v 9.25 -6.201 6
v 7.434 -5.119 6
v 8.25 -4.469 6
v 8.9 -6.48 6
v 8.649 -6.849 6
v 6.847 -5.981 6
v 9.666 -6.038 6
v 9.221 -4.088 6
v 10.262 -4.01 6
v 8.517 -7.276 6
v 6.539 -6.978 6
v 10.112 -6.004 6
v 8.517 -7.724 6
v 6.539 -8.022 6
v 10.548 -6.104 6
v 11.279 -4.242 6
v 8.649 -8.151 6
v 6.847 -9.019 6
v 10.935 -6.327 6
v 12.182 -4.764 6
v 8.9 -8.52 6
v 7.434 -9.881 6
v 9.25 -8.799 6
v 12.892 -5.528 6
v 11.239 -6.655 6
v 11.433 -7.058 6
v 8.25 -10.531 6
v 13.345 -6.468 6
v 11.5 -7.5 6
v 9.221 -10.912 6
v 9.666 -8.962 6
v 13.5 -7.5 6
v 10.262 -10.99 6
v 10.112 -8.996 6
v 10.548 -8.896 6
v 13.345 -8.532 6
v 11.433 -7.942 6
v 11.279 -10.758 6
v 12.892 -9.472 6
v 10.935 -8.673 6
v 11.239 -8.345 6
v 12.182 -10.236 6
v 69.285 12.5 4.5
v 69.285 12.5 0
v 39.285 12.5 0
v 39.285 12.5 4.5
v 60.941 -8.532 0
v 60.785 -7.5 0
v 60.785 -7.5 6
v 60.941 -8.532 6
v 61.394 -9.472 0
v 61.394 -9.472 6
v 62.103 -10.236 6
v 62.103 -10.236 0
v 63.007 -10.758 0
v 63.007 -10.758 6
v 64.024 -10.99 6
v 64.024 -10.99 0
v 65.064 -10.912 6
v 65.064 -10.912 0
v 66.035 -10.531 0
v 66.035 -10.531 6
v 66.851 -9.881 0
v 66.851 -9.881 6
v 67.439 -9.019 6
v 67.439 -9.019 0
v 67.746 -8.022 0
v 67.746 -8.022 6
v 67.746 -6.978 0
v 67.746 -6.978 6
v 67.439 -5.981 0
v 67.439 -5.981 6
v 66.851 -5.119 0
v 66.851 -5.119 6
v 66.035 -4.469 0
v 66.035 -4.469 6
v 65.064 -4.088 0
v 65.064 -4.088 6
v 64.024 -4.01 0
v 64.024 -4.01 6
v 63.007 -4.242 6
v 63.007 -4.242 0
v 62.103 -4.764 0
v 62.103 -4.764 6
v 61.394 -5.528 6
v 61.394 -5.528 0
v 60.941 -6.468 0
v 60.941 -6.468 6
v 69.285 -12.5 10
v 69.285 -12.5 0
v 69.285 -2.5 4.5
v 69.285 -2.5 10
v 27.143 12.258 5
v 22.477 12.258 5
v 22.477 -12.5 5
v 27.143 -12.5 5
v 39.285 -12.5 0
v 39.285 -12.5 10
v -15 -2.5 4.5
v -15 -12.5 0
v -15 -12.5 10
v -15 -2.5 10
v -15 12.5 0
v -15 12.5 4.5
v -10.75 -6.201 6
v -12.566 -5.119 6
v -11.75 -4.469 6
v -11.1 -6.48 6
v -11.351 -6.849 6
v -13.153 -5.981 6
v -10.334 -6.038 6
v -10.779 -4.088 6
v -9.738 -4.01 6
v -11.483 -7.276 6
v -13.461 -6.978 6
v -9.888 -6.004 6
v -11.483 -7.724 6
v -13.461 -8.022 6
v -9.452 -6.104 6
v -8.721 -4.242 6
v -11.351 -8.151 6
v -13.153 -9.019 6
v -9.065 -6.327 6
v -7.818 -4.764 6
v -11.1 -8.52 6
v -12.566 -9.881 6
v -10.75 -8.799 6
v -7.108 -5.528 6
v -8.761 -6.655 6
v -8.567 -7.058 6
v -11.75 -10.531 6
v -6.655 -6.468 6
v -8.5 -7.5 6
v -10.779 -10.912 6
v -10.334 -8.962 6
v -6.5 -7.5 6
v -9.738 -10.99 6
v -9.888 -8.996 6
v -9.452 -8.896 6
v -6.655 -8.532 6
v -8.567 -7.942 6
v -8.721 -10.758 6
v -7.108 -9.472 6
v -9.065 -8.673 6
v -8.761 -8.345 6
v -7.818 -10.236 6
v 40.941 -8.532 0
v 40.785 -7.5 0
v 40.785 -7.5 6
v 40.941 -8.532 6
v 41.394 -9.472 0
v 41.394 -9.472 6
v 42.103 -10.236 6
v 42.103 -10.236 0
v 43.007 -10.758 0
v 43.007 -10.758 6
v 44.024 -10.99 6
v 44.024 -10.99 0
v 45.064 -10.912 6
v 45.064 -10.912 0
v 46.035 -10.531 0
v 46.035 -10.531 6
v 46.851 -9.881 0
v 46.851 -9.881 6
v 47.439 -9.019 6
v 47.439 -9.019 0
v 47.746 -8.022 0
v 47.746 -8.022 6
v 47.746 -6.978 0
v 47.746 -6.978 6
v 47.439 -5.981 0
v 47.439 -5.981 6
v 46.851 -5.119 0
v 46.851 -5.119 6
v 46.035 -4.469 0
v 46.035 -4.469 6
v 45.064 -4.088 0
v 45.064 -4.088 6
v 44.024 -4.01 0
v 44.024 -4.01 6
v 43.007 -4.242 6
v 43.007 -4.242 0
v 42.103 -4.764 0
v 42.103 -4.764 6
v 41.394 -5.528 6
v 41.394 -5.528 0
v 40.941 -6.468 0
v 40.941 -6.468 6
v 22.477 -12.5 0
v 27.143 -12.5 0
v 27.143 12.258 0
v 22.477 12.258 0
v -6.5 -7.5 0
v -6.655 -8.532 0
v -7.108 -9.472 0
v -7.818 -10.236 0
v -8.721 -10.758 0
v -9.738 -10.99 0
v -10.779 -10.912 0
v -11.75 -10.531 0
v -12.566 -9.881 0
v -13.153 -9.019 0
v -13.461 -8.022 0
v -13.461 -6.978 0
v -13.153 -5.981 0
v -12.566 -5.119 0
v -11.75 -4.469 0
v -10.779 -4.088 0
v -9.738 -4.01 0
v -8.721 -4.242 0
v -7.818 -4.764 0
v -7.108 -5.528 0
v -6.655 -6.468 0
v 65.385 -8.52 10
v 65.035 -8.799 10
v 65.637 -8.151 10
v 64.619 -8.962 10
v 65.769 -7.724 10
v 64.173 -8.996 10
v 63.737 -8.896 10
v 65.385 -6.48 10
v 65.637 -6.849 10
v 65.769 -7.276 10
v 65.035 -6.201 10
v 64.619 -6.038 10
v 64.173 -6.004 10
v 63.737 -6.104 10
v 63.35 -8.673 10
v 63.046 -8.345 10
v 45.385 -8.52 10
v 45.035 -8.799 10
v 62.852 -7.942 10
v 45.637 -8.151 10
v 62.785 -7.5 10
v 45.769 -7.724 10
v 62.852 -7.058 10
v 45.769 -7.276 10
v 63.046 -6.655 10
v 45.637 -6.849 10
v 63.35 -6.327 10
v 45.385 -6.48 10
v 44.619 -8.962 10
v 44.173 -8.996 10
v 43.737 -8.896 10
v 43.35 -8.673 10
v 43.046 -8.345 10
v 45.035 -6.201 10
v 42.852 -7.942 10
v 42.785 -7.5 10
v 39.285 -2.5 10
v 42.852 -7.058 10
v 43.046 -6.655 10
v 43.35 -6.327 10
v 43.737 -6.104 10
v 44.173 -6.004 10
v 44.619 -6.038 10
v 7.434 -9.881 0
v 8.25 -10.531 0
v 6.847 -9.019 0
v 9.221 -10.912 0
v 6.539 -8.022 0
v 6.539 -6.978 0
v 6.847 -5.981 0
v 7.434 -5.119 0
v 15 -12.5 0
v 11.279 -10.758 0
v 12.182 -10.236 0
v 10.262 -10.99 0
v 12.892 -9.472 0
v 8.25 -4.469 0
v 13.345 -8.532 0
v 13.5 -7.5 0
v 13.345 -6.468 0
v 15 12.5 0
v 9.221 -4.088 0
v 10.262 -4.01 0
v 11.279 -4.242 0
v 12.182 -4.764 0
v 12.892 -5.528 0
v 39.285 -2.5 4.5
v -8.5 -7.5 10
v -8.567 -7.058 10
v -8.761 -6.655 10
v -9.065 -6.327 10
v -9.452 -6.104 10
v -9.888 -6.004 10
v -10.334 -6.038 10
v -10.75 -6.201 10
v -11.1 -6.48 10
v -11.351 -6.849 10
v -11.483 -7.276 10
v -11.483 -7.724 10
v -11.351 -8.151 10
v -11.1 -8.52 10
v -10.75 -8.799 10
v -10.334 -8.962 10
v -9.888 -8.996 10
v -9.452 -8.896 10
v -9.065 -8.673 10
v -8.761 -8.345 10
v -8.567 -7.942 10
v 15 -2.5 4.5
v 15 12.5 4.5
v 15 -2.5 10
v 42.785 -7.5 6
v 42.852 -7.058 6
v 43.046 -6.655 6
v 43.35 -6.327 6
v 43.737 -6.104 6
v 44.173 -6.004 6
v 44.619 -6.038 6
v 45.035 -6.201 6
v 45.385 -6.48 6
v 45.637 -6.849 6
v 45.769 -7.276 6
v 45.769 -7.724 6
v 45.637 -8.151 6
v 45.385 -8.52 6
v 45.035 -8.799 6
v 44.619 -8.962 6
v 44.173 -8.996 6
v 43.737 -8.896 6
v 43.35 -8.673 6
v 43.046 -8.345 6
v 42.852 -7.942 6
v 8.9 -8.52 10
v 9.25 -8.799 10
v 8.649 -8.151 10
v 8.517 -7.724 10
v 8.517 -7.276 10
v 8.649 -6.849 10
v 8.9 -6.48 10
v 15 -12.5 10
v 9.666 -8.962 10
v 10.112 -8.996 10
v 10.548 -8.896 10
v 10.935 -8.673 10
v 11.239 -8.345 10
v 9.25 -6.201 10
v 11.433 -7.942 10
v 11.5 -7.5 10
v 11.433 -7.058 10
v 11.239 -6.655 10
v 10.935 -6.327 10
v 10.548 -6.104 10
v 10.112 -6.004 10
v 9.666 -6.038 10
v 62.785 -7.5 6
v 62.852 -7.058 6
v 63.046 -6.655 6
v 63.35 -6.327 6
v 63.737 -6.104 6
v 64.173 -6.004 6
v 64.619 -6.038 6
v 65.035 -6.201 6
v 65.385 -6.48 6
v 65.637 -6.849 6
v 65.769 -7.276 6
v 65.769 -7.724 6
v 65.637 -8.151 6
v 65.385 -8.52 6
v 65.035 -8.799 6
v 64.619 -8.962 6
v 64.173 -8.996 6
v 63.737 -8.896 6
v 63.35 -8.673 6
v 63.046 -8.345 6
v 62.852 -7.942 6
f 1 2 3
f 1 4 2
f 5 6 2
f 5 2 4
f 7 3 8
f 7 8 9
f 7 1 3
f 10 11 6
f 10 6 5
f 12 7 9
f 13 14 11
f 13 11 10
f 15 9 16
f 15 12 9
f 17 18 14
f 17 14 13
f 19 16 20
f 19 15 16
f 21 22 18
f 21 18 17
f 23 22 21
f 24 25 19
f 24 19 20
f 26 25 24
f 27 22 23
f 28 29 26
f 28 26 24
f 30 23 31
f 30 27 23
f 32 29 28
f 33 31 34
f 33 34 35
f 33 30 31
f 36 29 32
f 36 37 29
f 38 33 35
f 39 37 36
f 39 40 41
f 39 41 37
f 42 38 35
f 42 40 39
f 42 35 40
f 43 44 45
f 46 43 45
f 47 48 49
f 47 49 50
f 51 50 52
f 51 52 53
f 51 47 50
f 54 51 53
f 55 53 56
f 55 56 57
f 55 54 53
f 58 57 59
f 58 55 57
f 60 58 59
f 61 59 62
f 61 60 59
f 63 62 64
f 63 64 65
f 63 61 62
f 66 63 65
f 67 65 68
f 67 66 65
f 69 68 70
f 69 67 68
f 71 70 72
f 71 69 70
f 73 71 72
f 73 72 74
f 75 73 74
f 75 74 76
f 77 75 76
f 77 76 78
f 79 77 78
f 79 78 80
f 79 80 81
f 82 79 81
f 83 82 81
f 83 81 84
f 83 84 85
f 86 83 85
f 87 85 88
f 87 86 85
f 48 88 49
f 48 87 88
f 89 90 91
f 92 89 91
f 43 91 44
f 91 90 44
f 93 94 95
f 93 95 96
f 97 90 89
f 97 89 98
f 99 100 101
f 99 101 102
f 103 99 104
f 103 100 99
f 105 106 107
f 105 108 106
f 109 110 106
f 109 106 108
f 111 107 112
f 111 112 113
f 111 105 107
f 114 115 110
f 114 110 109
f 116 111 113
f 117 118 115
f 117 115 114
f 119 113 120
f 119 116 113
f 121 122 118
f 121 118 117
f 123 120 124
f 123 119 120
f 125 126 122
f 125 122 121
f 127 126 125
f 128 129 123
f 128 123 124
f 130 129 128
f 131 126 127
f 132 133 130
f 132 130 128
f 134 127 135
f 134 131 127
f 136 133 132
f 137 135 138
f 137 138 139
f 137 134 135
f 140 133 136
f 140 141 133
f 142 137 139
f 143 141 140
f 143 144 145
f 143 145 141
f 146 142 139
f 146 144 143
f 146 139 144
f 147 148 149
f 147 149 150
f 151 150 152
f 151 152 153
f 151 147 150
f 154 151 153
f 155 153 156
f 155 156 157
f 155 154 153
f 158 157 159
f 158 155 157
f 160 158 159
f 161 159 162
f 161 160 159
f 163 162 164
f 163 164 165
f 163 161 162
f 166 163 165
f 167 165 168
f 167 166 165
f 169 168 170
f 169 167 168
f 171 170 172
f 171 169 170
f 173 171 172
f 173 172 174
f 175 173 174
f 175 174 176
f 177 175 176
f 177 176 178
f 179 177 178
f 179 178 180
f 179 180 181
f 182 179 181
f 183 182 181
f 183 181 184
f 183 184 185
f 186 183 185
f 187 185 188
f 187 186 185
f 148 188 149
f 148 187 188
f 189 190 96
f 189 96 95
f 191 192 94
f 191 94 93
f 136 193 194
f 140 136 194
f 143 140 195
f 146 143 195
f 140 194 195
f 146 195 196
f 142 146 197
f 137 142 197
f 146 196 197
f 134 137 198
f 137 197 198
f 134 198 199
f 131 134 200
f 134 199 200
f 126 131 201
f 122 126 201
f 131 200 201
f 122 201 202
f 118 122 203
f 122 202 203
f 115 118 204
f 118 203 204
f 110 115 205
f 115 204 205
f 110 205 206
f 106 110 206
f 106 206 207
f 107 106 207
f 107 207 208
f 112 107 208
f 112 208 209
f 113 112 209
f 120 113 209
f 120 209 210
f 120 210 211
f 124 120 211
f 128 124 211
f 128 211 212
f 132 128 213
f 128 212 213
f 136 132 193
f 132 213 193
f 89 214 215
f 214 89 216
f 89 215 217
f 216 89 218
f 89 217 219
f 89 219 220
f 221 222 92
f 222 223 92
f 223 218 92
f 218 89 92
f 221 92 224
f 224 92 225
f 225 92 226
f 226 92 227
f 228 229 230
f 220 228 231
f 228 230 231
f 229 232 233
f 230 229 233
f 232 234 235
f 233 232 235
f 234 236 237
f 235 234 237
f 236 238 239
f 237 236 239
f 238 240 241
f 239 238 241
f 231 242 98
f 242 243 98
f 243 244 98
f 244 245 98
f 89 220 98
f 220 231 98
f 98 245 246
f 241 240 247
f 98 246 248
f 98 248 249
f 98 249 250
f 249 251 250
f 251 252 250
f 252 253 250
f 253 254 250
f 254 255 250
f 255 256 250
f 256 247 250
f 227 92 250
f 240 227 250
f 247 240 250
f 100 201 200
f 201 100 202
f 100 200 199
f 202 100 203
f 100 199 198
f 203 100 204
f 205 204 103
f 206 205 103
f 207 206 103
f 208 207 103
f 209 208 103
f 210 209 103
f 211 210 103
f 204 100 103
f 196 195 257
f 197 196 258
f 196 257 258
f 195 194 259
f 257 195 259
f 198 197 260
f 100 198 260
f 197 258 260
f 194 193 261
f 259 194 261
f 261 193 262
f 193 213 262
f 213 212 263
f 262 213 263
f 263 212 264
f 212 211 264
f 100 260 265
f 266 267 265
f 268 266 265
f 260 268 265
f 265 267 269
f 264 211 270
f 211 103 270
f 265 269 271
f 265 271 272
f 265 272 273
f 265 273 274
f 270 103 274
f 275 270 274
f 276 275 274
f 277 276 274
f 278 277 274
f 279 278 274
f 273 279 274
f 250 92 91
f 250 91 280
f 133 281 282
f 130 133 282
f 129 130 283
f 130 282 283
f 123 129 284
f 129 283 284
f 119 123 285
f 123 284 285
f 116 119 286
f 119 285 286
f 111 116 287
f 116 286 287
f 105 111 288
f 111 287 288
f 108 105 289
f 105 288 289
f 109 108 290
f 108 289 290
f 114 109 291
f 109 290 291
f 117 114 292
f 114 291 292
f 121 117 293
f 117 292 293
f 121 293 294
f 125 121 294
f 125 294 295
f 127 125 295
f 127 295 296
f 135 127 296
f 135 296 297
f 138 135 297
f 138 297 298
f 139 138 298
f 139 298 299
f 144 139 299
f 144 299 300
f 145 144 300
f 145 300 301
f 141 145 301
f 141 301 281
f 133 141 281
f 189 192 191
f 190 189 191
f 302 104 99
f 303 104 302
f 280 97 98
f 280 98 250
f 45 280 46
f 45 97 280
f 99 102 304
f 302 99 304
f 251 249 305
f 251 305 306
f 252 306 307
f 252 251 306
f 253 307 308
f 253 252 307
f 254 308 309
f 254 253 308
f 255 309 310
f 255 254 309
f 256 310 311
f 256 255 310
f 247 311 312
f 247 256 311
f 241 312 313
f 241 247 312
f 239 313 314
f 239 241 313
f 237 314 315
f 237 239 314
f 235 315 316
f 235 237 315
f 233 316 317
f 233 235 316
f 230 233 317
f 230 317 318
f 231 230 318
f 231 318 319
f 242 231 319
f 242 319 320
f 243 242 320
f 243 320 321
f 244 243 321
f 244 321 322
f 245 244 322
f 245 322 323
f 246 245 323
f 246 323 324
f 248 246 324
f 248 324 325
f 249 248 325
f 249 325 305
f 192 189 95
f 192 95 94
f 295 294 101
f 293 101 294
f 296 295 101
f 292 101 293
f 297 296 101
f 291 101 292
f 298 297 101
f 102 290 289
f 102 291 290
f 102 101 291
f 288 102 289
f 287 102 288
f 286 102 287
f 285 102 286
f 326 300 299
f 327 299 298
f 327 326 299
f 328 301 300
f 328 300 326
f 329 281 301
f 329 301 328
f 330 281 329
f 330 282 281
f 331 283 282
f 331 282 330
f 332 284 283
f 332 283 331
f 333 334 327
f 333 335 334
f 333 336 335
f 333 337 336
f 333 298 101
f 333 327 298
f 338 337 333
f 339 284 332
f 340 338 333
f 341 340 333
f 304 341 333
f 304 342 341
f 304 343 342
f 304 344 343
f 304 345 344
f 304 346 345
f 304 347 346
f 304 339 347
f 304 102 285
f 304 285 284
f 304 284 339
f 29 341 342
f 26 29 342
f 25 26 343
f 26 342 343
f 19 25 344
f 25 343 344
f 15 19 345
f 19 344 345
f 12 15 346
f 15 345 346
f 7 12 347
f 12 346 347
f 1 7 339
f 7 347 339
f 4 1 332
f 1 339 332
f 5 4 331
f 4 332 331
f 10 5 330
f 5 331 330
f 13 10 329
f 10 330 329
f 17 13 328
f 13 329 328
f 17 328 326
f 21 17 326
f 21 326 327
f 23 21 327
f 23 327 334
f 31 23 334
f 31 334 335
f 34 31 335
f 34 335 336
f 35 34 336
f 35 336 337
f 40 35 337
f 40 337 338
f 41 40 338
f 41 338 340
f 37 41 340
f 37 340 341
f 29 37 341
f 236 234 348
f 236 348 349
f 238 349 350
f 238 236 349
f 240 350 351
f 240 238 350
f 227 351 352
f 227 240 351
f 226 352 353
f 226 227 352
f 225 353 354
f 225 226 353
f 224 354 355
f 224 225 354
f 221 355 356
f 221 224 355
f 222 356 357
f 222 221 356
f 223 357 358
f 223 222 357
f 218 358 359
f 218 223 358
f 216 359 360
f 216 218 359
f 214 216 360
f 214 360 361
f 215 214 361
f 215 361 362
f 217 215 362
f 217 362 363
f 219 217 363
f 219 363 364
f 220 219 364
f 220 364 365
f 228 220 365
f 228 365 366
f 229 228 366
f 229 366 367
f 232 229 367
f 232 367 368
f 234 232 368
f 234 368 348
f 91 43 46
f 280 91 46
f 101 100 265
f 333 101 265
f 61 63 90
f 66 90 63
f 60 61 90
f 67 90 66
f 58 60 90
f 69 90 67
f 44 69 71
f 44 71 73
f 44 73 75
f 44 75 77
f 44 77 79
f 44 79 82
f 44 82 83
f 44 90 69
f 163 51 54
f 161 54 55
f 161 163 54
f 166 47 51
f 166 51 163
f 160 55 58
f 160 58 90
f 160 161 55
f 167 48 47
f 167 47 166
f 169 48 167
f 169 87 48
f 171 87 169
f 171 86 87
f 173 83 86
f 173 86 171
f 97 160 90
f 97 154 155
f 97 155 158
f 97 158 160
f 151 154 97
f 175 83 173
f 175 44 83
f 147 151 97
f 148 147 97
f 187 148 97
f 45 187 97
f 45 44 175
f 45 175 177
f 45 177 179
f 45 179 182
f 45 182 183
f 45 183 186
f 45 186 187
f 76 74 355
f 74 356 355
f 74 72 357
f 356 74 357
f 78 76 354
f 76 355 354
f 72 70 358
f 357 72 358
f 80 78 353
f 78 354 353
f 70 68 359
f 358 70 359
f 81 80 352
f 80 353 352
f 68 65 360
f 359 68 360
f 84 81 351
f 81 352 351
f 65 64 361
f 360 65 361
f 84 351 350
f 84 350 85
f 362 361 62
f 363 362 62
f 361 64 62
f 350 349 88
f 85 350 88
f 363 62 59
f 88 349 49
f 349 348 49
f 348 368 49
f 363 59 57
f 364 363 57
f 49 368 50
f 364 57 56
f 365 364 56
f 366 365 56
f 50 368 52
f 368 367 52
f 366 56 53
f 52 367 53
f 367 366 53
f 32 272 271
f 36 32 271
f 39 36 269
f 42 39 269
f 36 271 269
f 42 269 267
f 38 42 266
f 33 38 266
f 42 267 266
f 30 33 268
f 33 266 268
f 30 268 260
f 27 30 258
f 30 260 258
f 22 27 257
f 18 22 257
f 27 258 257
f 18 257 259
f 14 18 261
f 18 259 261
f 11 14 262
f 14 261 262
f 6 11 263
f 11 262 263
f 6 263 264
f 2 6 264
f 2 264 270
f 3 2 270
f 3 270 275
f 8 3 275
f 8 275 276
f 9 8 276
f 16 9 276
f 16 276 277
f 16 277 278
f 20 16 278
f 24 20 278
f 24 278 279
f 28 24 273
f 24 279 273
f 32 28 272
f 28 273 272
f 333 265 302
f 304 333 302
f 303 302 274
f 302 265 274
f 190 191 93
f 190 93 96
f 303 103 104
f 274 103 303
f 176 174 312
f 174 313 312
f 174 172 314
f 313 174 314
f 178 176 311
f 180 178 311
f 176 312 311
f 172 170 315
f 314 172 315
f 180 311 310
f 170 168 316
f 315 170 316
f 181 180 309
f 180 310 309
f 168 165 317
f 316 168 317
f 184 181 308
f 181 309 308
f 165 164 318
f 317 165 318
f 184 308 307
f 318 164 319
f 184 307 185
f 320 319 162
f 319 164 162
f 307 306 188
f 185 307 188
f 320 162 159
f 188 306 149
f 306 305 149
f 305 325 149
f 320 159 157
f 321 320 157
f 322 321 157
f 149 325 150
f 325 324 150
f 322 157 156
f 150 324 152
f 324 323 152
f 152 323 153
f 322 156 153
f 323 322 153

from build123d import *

# Parameters (mm, degrees)
F0_W     = 30
F0_H     = 25
F1_DEPTH = 10
F2_W     = 30
F2_H     = 15
F3_DEPTH = 5.5
F4_R     = 1.5
F5_DEPTH = 25
F6_R     = 3.5
F7_DEPTH = 6
F9_DEPTH = 5


with BuildPart() as f1:
    # F0 (on Top) → F1 (new body)
    with BuildSketch(Plane.XY):
        Rectangle(F0_W, F0_H)
    extrude(amount=F1_DEPTH)

    # F2 (on face) → F3 (cut)
    with BuildSketch(Plane.XY.offset(10)):
        with Locations((0, 5)):
            Rectangle(F2_W, F2_H)
    extrude(amount=-F3_DEPTH, mode=Mode.SUBTRACT)

    # F4 (on face) → F5 (cut)
    with BuildSketch(Plane.XY.offset(10)):
        with Locations((10, -7.5)):
            Circle(F4_R)
        with Locations((-10, -7.5)):
            Circle(F4_R)
    extrude(amount=-F5_DEPTH, mode=Mode.SUBTRACT)

    # F6 (on face) → F7 (cut)
    with BuildSketch(Plane(origin=(0, 0, 0), x_dir=(1, 0, 0), z_dir=(0, 0, -1))):
        with Locations((10, 7.5)):
            Circle(F6_R)
        with Locations((-10, 7.5)):
            Circle(F6_R)
    extrude(amount=-F7_DEPTH, mode=Mode.SUBTRACT)


with BuildPart() as f9:
    # F8 (on face) → F9 (new body)
    with BuildSketch(Plane(origin=(0, 0, 0), x_dir=(1, 0, 0), z_dir=(0, 0, -1))):
        Polygon((22.47723, 12.5), (22.47723, 0), (22.47723, -12.258405), (27.142728, -12.258405), (27.142728, 12.5), align=None)
    extrude(amount=-F9_DEPTH)


with BuildPart() as f10_1:
    # F10: instance of F1
    add(f1.part.mirror(Plane(origin=(27.142728, -0.120798, 2.5), x_dir=(0, 1, 0), z_dir=(1, 0, 0))))


solid = Compound([f1.part, f9.part, f10_1.part])
